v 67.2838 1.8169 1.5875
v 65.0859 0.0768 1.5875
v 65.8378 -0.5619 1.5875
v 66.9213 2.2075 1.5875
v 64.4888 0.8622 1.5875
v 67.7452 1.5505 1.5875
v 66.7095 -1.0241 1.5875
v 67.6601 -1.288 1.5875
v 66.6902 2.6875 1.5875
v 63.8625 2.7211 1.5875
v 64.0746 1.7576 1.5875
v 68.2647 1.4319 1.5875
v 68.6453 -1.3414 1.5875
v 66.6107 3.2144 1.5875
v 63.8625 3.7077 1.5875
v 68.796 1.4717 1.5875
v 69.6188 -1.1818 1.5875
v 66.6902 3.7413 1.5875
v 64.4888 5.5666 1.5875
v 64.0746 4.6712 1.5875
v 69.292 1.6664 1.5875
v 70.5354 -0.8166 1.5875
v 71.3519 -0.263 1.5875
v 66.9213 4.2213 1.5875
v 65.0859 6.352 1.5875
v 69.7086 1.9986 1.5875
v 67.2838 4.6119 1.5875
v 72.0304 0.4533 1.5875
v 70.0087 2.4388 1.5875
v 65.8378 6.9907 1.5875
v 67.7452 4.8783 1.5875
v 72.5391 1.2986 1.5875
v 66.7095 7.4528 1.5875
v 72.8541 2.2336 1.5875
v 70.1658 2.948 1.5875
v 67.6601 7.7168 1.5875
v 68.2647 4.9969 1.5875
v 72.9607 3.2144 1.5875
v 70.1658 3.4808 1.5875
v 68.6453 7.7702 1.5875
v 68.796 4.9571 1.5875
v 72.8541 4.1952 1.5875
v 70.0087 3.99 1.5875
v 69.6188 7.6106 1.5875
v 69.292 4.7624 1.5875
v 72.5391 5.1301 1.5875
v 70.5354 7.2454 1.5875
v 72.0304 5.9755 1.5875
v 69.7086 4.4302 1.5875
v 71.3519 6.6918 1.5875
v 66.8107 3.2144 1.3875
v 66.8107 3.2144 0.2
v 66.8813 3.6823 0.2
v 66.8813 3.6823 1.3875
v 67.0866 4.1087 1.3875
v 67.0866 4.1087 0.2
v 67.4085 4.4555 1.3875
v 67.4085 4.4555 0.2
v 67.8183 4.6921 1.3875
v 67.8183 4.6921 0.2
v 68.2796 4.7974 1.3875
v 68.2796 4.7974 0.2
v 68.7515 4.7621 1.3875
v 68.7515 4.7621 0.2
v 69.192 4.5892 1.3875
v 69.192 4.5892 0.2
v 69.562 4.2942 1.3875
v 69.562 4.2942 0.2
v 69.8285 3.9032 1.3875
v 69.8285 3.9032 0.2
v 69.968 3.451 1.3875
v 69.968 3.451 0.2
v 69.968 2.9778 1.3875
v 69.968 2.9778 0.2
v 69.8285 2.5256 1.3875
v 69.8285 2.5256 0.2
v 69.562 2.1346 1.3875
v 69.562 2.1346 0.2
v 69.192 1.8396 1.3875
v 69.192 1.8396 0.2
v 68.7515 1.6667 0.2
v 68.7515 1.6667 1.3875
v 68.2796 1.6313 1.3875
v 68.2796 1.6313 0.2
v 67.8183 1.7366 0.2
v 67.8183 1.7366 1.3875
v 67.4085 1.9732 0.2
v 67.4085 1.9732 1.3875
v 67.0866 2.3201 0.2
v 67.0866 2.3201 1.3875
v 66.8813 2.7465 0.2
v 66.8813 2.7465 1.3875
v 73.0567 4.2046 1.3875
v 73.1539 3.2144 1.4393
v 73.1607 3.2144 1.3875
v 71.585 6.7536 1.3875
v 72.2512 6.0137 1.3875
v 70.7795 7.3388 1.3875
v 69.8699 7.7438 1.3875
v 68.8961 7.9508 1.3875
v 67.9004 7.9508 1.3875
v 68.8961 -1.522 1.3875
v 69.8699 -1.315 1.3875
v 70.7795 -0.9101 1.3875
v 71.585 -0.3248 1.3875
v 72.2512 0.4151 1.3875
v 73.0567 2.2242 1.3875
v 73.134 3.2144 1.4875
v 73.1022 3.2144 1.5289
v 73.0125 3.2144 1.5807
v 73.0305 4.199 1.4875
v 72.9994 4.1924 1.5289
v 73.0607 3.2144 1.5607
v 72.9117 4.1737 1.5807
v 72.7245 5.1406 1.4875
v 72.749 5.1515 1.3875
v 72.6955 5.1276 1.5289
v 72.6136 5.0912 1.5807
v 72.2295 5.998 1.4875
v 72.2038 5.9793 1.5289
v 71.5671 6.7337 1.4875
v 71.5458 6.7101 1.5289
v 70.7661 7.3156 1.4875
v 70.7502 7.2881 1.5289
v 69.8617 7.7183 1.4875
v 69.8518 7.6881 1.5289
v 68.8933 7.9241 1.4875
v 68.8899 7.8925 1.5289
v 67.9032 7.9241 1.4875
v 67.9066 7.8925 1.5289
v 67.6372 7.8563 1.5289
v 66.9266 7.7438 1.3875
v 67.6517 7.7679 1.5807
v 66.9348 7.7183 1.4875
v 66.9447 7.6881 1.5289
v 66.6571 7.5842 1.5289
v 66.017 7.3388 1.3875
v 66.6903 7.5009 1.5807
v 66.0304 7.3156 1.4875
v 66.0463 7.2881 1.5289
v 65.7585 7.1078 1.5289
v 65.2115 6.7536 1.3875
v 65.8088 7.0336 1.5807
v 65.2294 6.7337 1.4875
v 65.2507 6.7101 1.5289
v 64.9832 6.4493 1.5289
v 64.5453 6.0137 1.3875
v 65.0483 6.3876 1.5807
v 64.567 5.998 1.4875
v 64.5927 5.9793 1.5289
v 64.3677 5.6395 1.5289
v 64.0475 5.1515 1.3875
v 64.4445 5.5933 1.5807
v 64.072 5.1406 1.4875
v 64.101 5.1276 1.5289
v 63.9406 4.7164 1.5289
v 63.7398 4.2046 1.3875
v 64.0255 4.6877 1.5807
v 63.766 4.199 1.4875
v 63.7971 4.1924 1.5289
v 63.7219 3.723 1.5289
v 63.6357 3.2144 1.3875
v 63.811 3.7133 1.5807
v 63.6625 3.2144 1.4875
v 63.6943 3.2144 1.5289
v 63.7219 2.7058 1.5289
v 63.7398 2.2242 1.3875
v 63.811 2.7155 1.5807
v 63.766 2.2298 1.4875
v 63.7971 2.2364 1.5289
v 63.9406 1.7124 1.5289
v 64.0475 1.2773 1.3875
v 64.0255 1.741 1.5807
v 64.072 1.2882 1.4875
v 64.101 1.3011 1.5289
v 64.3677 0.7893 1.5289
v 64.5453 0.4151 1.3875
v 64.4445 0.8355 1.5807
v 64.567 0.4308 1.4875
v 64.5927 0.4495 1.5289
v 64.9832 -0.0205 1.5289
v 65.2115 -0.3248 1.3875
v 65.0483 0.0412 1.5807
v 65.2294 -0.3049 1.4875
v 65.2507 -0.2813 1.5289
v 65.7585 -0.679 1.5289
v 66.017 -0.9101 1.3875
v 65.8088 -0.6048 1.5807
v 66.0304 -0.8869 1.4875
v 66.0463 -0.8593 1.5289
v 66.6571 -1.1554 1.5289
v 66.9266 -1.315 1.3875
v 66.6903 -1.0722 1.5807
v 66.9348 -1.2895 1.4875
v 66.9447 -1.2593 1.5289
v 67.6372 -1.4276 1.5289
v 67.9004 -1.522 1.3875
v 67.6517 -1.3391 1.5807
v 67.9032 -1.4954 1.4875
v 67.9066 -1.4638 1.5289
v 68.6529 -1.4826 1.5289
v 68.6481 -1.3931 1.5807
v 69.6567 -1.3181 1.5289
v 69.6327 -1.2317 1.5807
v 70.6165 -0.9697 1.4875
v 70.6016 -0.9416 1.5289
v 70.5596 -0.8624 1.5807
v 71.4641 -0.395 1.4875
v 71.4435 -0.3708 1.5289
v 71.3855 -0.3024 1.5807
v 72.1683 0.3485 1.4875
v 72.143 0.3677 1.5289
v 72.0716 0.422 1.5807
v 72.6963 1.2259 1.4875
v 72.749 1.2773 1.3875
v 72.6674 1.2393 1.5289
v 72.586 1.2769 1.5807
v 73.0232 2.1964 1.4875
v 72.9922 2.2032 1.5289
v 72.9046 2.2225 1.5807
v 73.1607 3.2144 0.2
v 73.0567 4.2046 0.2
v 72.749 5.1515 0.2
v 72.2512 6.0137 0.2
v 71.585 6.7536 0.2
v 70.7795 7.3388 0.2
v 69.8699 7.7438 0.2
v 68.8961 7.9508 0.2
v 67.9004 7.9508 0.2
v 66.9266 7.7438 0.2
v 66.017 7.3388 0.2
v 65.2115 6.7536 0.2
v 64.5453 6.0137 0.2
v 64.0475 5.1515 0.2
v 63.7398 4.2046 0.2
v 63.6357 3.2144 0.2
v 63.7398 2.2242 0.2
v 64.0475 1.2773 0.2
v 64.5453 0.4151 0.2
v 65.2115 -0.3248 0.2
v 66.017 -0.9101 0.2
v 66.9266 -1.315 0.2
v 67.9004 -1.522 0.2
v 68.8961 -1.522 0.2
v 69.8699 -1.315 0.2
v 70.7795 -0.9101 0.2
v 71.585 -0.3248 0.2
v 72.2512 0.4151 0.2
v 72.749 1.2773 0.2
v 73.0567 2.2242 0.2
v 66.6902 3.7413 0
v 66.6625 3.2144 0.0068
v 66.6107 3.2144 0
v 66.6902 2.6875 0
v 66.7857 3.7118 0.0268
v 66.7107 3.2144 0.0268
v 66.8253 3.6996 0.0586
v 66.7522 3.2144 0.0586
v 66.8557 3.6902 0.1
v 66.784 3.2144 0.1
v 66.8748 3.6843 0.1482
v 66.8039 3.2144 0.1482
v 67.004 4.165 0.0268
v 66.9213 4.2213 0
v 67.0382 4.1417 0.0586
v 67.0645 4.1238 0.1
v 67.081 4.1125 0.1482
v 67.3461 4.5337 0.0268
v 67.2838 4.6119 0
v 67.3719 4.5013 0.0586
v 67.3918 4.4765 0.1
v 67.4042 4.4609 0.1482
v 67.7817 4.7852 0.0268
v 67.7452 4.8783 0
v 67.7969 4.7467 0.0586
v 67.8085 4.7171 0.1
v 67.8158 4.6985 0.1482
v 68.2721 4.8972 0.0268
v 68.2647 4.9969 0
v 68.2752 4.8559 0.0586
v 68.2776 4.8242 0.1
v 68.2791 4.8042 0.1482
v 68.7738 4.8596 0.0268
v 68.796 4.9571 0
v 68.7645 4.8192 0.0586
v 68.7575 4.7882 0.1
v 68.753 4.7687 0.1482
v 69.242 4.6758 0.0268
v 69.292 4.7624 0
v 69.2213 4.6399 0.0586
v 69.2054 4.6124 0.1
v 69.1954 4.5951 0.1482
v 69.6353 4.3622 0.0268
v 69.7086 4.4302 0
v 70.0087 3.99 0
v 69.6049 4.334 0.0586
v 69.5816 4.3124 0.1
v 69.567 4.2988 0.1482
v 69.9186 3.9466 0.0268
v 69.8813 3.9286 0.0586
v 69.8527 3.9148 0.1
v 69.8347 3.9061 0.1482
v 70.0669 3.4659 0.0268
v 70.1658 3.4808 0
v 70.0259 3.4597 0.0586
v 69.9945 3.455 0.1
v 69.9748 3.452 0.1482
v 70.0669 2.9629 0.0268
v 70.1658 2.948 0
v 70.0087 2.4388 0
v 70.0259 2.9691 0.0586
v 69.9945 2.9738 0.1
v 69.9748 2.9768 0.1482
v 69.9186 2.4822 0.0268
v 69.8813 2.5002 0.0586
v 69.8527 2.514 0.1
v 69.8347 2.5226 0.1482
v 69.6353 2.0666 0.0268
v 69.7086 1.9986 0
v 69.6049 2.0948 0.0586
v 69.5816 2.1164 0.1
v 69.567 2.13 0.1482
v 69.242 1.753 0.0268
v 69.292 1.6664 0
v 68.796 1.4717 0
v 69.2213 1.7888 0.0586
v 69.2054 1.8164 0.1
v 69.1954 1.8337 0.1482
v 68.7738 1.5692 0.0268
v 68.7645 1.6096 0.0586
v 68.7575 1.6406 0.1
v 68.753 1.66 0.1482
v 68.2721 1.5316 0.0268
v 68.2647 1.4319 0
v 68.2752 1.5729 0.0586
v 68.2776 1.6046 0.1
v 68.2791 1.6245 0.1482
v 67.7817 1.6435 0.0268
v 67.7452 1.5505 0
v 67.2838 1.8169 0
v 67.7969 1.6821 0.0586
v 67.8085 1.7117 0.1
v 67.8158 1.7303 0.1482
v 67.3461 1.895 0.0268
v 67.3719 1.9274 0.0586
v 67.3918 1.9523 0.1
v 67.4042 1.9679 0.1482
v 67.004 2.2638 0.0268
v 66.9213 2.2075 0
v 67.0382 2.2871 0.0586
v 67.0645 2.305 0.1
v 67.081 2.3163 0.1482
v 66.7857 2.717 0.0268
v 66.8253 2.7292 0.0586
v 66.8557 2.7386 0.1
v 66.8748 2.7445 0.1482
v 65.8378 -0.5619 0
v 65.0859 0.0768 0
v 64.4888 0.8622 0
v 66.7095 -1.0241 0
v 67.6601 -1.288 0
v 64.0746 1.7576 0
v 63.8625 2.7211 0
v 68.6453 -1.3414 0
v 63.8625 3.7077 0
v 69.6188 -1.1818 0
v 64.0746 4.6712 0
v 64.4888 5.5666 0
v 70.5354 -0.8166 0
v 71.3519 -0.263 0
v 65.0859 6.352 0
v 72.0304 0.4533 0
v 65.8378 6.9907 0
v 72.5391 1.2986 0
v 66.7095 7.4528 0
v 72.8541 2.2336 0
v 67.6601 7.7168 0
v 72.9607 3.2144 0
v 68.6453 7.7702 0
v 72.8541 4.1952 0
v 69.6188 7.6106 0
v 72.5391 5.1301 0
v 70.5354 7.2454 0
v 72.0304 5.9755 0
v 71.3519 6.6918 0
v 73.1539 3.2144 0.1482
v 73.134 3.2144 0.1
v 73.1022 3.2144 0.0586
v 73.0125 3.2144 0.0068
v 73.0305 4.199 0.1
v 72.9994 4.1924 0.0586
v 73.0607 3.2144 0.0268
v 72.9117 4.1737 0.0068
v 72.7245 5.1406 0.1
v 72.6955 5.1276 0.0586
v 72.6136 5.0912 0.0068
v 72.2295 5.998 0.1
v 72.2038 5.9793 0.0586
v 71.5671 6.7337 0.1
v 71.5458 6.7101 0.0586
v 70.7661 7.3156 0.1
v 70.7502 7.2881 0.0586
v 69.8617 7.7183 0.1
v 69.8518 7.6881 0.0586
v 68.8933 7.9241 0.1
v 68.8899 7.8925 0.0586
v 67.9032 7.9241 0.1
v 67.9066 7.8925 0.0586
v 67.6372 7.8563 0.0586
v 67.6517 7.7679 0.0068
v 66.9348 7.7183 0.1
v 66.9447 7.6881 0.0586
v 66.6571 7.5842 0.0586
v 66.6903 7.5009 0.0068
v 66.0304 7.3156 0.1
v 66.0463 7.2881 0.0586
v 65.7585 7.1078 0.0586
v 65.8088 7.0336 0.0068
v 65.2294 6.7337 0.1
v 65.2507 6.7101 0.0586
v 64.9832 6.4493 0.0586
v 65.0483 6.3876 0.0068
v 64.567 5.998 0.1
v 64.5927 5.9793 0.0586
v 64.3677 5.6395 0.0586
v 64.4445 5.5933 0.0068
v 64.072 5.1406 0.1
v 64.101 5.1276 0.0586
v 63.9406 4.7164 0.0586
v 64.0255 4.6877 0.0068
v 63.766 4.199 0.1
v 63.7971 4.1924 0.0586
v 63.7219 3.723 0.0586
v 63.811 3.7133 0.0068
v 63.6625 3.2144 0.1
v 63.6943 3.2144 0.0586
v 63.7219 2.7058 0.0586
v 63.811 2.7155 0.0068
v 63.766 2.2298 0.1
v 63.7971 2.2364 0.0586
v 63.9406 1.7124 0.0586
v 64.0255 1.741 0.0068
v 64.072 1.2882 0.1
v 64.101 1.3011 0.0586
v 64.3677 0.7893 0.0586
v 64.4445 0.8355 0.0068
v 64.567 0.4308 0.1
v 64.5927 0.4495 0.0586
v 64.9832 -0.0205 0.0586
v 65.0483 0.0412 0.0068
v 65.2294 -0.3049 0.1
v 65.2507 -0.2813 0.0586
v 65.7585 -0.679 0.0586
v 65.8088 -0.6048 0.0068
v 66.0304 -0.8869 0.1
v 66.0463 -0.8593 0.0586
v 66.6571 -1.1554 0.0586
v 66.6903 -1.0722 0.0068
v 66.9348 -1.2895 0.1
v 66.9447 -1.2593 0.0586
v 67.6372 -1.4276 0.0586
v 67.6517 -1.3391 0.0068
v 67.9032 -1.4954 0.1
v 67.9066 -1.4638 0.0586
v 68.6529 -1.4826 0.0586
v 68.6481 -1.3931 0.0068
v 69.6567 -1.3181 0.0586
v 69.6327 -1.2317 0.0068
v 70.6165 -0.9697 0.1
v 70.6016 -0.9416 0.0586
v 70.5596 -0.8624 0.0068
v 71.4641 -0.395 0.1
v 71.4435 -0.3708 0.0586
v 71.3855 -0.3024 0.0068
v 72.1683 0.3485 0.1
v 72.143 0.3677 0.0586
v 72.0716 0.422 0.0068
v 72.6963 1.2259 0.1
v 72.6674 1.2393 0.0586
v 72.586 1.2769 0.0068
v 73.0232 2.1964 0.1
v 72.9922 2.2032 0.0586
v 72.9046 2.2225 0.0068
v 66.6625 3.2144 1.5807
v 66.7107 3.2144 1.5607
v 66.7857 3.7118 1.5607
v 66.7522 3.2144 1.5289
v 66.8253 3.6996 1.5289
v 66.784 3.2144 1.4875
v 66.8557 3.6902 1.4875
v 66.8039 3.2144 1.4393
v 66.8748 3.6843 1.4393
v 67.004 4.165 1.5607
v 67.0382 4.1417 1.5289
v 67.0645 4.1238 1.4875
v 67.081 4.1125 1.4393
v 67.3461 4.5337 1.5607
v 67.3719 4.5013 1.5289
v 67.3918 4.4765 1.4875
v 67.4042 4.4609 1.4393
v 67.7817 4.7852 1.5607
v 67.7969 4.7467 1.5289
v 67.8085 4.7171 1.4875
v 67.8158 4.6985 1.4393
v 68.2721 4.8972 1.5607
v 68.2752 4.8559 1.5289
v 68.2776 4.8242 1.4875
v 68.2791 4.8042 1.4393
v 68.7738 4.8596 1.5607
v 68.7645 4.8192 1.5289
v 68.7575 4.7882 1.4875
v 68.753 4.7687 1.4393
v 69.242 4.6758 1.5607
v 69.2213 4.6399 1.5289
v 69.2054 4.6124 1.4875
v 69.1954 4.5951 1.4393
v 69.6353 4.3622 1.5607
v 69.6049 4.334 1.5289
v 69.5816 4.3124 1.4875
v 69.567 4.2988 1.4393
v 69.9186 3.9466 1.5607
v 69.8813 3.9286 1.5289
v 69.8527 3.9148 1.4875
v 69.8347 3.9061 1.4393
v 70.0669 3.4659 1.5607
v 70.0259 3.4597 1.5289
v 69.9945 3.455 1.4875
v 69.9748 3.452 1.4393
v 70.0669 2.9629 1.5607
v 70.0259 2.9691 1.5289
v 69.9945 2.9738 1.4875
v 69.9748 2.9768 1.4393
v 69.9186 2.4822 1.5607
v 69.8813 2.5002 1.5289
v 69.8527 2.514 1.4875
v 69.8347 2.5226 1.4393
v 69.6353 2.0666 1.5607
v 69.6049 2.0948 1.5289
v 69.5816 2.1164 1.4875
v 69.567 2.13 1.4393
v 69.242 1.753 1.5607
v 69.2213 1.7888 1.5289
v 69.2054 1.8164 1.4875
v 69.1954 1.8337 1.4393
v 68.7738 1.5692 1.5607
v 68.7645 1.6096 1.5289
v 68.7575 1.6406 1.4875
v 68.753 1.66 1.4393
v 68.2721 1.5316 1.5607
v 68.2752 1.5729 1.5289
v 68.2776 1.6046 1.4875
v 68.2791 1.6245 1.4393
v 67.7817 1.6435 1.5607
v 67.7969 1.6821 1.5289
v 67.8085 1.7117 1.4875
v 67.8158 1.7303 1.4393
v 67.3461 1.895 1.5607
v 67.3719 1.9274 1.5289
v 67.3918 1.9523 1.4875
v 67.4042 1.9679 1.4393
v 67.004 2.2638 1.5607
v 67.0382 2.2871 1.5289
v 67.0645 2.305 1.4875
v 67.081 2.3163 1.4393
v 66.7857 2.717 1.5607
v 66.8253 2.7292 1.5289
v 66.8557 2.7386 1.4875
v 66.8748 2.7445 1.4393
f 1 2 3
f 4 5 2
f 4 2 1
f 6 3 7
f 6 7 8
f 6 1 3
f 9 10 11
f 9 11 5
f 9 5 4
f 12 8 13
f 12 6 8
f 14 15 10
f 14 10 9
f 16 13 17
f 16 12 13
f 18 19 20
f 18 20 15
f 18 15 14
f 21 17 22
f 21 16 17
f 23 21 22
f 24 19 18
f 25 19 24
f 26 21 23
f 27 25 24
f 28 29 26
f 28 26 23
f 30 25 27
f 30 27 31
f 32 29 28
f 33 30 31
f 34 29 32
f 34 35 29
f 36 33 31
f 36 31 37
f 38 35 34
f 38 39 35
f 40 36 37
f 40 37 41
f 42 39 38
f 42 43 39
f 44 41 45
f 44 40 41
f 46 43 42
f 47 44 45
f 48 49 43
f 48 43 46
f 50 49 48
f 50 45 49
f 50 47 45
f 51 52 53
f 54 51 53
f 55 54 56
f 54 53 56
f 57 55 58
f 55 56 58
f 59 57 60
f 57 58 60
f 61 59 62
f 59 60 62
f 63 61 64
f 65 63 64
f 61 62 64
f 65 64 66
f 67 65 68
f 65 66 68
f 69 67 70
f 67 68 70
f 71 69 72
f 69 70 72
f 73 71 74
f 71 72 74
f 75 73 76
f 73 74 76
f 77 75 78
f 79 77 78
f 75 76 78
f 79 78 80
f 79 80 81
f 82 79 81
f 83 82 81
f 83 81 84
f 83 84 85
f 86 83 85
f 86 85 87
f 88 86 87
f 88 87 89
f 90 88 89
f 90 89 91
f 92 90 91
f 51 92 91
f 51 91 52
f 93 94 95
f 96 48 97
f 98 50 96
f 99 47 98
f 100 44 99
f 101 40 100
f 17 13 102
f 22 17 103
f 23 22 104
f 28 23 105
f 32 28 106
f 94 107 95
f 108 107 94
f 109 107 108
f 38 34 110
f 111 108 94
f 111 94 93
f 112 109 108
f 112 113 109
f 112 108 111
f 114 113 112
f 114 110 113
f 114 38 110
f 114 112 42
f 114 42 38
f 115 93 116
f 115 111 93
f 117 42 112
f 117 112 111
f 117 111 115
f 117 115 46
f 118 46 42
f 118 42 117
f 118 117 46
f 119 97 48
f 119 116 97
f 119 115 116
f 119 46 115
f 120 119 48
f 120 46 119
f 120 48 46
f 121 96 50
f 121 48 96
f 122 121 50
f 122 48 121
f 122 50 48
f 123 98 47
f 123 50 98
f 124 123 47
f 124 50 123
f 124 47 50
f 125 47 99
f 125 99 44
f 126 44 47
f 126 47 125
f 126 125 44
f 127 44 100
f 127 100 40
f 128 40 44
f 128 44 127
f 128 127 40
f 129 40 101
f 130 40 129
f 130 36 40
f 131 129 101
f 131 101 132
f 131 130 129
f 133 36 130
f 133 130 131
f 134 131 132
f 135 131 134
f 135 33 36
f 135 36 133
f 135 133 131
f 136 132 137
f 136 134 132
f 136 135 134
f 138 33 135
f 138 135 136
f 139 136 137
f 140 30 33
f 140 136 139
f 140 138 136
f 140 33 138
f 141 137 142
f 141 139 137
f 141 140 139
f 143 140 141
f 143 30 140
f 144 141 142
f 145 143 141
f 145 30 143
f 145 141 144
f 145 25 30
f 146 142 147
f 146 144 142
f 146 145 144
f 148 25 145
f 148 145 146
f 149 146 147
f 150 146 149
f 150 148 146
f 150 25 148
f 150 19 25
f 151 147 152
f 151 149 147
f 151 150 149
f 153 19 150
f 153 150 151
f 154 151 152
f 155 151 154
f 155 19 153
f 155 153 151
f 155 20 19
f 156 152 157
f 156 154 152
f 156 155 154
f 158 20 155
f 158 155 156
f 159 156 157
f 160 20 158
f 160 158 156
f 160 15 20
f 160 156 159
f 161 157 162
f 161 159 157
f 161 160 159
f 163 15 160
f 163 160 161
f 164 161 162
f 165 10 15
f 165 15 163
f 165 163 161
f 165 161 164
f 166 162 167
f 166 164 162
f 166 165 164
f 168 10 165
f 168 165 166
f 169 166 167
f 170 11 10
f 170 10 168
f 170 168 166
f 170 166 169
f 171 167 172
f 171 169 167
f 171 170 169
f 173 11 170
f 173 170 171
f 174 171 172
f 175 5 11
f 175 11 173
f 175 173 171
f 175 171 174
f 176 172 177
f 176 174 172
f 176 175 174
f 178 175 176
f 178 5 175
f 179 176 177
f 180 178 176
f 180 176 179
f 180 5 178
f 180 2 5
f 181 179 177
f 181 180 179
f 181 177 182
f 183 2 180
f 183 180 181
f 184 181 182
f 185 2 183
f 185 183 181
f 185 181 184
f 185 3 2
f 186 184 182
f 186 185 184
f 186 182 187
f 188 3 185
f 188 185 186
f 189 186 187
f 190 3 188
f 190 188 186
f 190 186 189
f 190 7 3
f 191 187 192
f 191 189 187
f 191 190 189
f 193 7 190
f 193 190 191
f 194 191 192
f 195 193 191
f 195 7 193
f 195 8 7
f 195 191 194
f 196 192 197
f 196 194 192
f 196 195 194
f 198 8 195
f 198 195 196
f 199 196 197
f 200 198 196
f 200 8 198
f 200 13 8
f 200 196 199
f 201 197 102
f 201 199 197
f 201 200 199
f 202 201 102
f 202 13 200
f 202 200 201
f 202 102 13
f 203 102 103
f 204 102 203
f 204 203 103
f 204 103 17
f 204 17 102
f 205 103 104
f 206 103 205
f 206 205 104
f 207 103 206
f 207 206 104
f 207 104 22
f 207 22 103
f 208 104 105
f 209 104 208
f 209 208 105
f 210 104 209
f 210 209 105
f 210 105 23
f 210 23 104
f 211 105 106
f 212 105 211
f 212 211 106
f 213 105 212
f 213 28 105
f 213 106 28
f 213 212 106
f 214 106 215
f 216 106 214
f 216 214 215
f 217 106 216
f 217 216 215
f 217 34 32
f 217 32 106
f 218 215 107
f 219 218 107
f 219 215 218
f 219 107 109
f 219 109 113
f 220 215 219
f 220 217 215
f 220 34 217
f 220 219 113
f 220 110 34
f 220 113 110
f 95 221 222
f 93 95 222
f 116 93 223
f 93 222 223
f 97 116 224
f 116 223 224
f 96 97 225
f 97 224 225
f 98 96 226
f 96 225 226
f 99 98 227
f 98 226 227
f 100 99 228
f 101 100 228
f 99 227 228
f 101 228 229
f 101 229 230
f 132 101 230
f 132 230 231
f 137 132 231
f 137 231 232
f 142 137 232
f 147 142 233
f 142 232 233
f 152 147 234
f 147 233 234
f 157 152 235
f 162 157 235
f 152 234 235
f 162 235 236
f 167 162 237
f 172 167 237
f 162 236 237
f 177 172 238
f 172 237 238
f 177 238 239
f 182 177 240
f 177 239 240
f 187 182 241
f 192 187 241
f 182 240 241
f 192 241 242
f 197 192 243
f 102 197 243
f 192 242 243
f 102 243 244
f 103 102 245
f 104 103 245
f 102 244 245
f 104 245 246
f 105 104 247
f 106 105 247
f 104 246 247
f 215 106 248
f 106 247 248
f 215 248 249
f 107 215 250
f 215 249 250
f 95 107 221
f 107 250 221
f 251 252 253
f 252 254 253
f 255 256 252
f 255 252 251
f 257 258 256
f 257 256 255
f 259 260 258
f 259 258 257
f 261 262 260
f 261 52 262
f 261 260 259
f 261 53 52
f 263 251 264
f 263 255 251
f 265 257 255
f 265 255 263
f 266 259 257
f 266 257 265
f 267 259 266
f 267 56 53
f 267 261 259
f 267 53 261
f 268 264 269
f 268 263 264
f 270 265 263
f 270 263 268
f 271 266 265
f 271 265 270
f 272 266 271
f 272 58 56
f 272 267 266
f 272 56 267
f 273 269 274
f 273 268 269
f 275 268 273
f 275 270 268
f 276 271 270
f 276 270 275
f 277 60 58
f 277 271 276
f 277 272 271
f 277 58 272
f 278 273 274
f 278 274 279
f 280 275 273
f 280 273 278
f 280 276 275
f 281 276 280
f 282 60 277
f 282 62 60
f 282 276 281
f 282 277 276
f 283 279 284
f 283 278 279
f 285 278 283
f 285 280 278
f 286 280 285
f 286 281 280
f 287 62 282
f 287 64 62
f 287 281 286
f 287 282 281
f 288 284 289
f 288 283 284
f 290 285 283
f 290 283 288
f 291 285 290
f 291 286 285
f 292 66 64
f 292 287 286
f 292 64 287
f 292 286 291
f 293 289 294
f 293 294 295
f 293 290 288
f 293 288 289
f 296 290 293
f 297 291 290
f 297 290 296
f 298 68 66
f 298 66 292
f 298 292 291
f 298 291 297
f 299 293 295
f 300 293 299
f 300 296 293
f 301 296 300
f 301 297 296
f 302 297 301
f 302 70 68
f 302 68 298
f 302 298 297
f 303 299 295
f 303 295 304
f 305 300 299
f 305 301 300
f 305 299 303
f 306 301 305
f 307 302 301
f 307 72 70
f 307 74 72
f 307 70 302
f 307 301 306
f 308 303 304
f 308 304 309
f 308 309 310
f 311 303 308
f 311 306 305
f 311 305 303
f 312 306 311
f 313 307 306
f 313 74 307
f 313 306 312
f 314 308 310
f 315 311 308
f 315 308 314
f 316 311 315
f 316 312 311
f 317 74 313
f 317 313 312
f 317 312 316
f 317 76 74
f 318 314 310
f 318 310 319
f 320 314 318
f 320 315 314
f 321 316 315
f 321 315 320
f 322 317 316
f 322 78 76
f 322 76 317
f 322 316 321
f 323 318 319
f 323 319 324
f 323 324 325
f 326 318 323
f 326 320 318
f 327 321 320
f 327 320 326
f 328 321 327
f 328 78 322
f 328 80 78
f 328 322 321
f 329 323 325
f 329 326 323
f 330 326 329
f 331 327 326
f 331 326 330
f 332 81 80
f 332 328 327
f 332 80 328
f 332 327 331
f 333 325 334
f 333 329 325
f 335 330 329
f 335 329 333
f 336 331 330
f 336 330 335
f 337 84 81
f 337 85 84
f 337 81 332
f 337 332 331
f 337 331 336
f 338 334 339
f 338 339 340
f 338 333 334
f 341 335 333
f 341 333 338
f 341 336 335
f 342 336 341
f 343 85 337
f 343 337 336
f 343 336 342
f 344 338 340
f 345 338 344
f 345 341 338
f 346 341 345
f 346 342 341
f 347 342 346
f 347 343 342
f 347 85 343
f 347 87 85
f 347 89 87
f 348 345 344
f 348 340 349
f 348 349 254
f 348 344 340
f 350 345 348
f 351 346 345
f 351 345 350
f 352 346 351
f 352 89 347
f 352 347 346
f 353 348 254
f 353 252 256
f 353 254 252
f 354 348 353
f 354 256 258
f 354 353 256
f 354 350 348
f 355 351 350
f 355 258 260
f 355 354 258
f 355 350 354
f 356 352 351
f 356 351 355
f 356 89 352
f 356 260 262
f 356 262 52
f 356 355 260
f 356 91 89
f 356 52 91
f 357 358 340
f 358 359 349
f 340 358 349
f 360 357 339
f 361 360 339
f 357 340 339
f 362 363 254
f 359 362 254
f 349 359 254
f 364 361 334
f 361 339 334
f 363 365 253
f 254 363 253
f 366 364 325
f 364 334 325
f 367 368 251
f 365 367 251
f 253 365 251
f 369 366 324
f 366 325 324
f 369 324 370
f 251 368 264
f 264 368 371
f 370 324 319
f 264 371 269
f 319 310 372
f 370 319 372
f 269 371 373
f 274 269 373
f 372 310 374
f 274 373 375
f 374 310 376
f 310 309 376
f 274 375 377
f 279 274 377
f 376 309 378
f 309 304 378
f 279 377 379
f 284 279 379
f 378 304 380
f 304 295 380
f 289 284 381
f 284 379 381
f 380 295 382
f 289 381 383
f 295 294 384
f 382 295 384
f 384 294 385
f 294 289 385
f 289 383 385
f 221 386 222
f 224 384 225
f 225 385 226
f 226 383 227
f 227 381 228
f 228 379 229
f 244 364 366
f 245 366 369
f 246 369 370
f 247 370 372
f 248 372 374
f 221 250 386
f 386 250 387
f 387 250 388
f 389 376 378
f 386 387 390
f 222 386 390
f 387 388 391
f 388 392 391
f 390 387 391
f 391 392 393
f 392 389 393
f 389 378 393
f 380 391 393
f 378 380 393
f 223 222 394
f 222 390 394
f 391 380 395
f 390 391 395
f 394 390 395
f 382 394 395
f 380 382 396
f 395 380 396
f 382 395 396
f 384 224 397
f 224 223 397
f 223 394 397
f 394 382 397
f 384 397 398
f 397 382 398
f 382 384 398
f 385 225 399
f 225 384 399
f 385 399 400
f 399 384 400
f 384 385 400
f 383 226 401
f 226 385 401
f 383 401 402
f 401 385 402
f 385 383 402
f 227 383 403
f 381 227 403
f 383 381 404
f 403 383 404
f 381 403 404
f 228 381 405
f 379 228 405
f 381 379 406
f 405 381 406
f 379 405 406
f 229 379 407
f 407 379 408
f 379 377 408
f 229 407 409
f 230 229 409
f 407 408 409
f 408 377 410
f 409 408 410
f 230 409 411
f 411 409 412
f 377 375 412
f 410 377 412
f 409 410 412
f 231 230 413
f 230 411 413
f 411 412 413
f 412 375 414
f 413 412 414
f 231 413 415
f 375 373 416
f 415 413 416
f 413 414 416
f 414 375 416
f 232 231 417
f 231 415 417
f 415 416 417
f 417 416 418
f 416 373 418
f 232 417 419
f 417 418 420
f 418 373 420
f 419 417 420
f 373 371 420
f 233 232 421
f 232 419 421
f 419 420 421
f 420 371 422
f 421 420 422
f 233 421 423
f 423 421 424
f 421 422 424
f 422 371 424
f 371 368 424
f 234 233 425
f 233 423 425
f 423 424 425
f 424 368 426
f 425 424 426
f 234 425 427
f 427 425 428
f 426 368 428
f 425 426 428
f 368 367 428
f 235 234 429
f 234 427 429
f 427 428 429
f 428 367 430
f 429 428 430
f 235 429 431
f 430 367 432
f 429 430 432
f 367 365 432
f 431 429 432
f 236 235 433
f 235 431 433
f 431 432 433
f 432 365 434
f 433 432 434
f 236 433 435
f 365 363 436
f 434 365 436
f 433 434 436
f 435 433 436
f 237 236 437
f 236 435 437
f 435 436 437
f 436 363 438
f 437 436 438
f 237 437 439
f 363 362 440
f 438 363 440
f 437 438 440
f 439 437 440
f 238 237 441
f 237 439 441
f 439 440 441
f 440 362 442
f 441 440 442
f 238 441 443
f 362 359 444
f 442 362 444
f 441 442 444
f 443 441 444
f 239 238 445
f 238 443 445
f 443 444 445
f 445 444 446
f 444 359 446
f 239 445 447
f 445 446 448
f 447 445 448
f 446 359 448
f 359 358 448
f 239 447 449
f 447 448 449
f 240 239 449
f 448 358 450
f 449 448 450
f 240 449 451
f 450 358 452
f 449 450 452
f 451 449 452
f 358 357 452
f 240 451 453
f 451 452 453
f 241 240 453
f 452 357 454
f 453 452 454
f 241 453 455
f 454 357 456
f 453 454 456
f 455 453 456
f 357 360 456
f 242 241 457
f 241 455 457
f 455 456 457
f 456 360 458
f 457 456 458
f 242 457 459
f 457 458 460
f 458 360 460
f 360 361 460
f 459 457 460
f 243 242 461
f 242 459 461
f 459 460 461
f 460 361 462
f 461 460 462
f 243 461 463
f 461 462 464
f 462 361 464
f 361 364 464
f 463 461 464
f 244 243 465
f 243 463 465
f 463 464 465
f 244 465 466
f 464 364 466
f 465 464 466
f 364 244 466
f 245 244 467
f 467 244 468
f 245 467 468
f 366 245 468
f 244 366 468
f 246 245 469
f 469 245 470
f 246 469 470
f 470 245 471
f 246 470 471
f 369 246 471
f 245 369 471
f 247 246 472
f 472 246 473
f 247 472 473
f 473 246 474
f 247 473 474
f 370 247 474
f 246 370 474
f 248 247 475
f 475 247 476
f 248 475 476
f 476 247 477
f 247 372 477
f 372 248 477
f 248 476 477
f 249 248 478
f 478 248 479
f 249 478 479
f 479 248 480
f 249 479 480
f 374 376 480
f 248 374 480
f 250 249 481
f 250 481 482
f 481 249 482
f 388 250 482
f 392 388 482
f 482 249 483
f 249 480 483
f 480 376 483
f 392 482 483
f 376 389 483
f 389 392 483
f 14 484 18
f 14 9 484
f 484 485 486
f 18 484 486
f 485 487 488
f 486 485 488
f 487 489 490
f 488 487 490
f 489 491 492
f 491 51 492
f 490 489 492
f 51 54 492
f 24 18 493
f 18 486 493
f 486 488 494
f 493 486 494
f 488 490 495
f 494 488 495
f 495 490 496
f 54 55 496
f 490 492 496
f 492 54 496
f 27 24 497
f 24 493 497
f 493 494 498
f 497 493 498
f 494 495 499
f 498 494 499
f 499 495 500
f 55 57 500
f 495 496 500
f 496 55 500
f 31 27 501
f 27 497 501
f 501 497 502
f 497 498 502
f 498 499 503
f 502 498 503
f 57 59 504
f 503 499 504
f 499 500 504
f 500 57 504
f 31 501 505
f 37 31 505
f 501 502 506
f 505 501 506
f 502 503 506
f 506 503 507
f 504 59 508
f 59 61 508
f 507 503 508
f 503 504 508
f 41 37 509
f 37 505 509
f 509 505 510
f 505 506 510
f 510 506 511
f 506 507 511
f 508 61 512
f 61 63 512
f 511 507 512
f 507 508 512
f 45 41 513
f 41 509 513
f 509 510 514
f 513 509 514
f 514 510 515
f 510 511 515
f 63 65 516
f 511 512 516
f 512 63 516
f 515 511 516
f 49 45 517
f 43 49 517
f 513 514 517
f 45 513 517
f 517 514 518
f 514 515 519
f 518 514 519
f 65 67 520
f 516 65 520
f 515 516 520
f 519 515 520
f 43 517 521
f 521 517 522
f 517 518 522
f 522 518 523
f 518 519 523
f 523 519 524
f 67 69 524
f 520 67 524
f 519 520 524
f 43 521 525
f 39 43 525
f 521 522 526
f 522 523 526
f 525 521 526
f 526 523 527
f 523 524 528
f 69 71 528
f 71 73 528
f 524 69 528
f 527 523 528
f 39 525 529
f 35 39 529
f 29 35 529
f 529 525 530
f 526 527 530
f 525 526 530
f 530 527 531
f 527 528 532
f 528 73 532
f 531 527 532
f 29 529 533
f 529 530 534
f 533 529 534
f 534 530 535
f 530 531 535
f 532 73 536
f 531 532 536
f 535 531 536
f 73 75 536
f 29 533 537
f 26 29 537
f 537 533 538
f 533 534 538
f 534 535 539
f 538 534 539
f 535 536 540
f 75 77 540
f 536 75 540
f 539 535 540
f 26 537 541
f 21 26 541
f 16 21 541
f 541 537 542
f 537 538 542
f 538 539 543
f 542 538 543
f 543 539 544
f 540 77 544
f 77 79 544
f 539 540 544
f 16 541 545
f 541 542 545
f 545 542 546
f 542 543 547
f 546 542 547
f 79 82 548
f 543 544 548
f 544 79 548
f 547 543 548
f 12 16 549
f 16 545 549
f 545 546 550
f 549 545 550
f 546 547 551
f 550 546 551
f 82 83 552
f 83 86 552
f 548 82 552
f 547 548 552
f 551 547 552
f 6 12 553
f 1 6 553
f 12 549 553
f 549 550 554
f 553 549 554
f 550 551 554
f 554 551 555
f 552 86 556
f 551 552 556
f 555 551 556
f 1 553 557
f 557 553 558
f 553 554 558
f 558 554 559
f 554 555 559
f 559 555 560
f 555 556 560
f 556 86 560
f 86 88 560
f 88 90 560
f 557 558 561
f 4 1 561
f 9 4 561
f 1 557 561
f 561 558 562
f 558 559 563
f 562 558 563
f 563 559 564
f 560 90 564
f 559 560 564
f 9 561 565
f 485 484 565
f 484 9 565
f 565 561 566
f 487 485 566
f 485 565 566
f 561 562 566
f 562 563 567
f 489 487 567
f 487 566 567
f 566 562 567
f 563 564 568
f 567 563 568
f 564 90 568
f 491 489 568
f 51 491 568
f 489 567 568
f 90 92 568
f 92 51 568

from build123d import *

# Parameters (mm, degrees)
SKETCH1_R           = 4.7625
BOSS_EXTRUDE1_DEPTH = 1.5875
SKETCH2_R           = 1.5875
CUT_EXTRUDE1_DEPTH  = 74.611450938
FILLET1_R           = 0.2
FILLET2_R           = 0.2


with BuildPart() as part:
    # Sketch1 → Boss-Extrude1 (new body)
    with BuildSketch(Plane.XY):
        with Locations((68.398246491, 3.214386977)):
            Circle(SKETCH1_R)
    extrude(amount=BOSS_EXTRUDE1_DEPTH)

    # Sketch2 → Cut-Extrude1 (cut, through all)
    with BuildSketch(Plane(origin=(0, 0, 0), x_dir=(-1, 0, 0), z_dir=(0, 0, -1))):
        with Locations((-68.398246491, 3.214386977)):
            Circle(SKETCH2_R)
    extrude(amount=-CUT_EXTRUDE1_DEPTH, mode=Mode.SUBTRACT)

    # Fillet1
    fillet1_edges = [part.edges().sort_by_distance(p)[0] for p in [
        (63.635746491, 3.214386977, 1.5875),
        (69.985746491, 3.214386977, 1.5875),
        (69.985746491, 3.214386977, 0),
    ]]
    fillet(fillet1_edges, radius=FILLET1_R)

    # Fillet2
    fillet2_edges = [part.edges().sort_by_distance(p)[0] for p in [
        (63.635746491, 3.214386977, 0),
    ]]
    fillet(fillet2_edges, radius=FILLET2_R)


solid = part.part
